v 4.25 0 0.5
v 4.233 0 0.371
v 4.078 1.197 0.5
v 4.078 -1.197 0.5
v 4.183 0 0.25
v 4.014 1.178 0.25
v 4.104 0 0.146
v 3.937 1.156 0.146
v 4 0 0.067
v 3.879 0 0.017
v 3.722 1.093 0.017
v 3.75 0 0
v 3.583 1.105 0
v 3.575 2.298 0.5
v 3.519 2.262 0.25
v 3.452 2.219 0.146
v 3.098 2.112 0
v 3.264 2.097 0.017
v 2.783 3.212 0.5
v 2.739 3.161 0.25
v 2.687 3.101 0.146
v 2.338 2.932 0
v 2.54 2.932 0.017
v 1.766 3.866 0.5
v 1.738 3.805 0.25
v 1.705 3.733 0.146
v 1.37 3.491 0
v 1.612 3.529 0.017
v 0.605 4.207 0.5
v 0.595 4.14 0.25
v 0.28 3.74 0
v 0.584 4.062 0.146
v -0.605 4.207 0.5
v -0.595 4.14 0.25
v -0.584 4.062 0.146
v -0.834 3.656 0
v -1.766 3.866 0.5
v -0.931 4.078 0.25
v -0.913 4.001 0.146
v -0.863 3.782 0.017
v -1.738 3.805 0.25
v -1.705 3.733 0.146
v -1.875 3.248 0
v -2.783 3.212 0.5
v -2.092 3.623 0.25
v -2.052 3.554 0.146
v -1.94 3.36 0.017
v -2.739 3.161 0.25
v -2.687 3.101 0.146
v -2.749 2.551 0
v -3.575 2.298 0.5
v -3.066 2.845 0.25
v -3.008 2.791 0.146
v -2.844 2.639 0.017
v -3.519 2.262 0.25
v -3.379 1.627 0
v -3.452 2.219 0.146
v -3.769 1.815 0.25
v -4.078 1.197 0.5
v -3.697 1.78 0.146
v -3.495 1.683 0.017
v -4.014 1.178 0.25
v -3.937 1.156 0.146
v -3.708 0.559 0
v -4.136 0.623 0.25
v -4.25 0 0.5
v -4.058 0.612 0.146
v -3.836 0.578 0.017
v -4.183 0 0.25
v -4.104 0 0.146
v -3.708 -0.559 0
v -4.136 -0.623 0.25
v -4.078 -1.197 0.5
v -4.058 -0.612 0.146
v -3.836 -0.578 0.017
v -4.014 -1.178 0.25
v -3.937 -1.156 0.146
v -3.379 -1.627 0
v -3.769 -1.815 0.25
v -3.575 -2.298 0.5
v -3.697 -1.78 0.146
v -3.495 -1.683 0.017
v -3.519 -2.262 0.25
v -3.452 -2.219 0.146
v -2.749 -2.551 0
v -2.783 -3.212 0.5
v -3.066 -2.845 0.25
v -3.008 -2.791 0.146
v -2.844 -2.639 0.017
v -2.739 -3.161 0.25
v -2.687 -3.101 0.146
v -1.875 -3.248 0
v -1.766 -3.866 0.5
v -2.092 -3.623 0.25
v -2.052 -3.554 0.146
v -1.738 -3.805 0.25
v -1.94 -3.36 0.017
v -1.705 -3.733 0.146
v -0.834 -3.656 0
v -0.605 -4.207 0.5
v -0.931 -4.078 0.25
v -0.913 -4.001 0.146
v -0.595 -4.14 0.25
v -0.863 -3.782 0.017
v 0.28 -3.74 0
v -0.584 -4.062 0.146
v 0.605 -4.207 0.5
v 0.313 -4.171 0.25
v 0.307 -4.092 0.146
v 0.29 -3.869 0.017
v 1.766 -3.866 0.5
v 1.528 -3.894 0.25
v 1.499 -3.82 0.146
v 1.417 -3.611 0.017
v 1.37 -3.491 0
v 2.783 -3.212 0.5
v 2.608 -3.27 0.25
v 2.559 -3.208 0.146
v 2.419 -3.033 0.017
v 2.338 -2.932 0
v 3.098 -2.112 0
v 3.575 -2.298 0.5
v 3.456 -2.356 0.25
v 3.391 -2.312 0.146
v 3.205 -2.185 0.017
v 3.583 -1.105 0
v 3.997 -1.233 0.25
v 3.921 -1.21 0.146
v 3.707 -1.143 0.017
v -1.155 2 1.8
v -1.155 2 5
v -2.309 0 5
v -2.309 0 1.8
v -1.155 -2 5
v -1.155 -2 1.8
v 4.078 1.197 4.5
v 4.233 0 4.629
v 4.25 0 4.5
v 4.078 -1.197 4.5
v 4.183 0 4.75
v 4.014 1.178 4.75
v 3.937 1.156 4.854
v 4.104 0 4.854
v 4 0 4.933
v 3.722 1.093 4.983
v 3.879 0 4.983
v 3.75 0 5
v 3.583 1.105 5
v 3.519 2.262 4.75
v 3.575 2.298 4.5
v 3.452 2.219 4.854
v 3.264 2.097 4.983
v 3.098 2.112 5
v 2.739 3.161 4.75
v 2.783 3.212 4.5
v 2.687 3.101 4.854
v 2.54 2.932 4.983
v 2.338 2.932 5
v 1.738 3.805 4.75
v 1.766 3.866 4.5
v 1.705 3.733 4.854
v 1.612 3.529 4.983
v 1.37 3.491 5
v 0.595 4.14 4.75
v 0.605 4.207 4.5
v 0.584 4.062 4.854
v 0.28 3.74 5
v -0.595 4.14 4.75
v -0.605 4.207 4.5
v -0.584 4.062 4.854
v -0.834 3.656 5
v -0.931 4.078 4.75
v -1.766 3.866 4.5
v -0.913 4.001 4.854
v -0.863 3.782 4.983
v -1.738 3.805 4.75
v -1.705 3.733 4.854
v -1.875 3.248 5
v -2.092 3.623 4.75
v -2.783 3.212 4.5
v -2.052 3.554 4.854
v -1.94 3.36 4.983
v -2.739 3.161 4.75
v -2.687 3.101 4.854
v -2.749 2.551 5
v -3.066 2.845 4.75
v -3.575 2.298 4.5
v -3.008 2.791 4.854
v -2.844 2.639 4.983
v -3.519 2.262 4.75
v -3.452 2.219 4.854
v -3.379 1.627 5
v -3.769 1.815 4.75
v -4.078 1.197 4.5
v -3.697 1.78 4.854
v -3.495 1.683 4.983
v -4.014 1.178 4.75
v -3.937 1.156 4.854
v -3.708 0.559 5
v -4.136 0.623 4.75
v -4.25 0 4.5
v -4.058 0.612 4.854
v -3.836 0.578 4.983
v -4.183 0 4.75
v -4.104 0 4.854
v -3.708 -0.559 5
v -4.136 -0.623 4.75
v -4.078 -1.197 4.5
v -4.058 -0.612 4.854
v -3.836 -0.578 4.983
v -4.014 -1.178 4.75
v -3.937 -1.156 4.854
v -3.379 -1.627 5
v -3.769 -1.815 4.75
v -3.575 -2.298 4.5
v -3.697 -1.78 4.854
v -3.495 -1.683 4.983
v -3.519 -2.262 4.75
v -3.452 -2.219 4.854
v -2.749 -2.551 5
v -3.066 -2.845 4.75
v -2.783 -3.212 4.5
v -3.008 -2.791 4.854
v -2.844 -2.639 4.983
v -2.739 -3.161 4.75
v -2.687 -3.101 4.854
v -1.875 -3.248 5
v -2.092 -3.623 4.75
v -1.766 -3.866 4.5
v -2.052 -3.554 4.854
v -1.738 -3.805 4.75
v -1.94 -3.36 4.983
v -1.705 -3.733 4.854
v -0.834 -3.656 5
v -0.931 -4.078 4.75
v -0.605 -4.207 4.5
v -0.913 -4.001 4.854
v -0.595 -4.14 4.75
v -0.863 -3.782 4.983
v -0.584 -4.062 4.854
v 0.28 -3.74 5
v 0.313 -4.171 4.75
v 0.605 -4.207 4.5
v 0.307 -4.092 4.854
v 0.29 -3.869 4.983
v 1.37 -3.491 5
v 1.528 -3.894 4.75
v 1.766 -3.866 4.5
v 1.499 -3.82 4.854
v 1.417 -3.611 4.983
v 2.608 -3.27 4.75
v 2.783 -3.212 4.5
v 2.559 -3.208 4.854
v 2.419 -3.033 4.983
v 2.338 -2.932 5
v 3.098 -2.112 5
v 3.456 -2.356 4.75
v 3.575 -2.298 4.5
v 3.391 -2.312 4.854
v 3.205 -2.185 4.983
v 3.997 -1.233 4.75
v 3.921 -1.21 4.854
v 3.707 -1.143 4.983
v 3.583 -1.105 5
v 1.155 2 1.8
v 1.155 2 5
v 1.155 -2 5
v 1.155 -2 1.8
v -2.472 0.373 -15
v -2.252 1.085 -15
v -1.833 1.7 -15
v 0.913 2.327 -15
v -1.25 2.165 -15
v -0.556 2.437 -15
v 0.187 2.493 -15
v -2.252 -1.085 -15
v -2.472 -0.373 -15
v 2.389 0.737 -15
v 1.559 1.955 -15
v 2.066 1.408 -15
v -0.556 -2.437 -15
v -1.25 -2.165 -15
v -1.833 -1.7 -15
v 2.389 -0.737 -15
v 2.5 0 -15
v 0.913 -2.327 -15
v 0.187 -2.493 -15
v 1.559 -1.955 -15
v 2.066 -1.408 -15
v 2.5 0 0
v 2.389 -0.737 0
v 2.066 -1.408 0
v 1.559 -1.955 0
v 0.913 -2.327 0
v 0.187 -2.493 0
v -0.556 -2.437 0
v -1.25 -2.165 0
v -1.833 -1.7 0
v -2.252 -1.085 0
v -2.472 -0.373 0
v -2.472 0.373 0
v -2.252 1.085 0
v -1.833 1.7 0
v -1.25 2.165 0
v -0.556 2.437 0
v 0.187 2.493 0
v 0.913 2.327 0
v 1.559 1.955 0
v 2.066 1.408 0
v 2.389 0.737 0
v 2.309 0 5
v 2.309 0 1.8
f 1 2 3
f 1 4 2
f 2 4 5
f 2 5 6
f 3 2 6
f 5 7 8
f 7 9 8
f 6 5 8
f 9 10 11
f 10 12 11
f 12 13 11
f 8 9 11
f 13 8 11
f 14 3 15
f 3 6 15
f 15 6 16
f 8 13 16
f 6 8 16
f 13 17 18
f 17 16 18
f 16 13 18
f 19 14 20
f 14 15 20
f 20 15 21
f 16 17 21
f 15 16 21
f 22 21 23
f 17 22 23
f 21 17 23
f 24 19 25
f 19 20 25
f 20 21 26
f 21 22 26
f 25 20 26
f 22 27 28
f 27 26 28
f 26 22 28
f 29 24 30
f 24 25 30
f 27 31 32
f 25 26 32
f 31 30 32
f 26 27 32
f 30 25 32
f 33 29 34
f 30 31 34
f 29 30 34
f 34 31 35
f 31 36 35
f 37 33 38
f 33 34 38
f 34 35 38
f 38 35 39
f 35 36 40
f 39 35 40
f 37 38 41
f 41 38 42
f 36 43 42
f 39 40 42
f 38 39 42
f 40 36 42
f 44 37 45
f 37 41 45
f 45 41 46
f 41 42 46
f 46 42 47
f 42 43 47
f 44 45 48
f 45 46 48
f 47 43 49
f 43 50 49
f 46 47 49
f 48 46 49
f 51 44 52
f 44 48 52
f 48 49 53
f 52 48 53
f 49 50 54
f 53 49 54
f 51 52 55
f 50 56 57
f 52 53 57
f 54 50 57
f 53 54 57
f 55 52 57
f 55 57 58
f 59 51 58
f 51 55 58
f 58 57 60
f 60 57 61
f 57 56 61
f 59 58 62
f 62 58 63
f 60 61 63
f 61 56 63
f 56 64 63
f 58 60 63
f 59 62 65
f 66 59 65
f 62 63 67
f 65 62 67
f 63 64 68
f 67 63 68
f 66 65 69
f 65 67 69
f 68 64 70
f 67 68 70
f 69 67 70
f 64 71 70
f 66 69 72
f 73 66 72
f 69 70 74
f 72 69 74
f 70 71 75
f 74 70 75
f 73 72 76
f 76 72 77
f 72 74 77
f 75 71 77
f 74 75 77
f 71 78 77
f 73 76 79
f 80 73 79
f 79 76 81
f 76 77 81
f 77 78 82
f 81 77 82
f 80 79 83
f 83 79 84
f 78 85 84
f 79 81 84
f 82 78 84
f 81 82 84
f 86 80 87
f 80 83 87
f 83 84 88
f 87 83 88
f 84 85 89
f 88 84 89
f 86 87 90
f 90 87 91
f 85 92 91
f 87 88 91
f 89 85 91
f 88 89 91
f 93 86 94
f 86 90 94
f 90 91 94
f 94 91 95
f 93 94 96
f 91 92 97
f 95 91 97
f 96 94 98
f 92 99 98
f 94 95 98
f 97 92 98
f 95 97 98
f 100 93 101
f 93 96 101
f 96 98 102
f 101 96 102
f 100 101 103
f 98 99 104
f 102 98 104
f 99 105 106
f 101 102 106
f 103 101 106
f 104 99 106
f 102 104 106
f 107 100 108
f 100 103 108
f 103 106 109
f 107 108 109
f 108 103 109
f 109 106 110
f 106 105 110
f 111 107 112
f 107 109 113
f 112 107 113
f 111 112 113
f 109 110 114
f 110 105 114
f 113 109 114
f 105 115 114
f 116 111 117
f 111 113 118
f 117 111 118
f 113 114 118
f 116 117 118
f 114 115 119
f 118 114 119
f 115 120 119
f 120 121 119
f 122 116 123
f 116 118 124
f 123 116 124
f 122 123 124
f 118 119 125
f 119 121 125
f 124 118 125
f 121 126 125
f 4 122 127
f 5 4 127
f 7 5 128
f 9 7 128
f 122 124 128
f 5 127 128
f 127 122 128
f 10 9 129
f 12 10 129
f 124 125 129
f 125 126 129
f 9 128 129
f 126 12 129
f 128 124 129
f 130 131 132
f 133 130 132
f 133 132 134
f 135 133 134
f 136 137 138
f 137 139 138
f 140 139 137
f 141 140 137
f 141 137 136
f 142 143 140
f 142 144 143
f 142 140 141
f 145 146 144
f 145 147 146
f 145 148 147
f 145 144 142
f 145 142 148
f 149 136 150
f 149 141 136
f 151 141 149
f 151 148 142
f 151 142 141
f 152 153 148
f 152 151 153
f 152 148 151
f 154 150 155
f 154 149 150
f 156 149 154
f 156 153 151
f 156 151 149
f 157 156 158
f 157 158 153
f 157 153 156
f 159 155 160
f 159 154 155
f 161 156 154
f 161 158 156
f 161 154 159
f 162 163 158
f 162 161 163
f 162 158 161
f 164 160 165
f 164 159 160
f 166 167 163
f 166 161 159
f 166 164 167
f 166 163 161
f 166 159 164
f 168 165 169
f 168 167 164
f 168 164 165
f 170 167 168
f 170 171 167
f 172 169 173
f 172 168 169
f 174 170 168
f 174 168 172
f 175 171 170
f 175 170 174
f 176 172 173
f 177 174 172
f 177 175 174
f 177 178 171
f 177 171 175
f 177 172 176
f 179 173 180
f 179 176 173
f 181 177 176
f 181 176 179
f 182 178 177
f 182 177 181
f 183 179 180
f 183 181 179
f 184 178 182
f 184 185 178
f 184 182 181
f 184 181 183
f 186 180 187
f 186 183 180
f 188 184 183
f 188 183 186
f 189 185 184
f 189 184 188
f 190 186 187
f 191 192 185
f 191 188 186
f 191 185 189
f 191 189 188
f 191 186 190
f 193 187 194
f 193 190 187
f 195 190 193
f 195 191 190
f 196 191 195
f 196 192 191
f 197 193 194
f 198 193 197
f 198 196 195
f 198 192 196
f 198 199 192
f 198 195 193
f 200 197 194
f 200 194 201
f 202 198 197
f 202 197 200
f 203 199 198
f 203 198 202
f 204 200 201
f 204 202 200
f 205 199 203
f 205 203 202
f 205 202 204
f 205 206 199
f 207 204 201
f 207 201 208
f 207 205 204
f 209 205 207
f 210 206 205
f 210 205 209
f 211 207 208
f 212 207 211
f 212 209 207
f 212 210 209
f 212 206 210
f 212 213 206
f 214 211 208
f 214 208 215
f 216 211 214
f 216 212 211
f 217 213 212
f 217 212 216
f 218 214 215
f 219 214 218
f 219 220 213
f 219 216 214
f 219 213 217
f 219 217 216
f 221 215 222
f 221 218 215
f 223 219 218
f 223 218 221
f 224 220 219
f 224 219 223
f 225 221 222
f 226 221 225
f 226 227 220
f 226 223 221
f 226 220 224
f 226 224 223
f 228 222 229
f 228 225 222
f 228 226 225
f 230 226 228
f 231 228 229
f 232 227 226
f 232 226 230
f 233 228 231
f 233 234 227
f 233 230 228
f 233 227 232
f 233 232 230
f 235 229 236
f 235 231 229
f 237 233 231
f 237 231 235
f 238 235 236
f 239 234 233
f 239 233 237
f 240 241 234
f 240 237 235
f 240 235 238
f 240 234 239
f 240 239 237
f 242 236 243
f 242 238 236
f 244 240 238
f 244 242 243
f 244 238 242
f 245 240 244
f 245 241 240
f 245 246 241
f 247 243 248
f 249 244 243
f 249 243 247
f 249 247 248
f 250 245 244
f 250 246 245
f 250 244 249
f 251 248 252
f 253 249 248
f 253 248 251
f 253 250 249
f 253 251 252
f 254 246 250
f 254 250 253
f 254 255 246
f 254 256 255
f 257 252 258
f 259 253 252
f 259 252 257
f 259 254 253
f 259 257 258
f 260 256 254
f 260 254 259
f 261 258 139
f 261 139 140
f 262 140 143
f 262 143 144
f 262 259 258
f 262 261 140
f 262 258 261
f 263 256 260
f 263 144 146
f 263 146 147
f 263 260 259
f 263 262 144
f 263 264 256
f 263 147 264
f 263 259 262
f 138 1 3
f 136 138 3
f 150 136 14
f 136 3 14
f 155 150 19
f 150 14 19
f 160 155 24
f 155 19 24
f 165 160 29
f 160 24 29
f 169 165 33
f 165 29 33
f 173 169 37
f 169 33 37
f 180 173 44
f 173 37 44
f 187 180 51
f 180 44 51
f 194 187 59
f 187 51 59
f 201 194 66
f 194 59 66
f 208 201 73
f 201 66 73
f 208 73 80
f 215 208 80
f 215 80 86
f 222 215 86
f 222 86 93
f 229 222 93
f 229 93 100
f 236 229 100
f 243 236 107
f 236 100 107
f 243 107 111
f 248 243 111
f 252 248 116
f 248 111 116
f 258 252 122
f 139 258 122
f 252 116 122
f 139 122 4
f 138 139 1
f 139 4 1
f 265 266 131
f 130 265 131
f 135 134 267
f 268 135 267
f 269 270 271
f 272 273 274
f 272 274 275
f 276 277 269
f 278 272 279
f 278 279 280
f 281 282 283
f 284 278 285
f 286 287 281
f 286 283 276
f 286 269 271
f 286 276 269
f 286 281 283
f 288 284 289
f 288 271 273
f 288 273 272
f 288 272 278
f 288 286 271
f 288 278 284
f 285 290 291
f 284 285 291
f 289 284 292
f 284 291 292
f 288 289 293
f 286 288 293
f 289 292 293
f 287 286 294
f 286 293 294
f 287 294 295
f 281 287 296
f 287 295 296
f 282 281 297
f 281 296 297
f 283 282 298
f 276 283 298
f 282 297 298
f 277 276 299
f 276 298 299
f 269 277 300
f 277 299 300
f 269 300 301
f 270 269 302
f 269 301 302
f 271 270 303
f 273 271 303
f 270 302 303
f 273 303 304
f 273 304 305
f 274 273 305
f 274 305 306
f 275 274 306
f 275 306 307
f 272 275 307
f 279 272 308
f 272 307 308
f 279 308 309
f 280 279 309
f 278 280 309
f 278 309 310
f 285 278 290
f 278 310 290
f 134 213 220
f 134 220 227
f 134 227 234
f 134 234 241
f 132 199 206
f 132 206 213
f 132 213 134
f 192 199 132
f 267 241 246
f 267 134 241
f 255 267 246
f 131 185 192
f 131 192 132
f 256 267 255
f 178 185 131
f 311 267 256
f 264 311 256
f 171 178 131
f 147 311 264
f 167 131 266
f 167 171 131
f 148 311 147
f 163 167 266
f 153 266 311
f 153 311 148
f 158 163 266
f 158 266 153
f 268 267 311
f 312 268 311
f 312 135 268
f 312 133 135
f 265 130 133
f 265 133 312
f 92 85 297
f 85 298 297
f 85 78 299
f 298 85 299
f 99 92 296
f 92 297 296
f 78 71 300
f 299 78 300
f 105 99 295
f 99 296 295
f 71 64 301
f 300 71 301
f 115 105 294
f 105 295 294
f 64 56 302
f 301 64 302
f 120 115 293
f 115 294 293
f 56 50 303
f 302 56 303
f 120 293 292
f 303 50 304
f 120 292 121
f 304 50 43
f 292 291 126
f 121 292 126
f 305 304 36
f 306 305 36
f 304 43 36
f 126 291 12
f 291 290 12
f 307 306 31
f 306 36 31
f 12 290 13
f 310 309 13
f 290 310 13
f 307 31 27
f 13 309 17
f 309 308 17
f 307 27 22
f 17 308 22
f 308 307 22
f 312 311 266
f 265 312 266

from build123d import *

# Parameters (mm, degrees)
F0_R     = 4.25
F1_DEPTH = 5
F2_R     = 2.5
F3_DEPTH = 15
F5_DEPTH = 3.2
F6_R     = 0.5


with BuildPart() as f1:
    # F0 (on Top) → F1 (new body)
    with BuildSketch(Plane.XY):
        Circle(F0_R)
    extrude(amount=F1_DEPTH)

    # F2 (on face) → F3 (join)
    with BuildSketch(Plane(origin=(0, 0, 0), x_dir=(1, 0, 0), z_dir=(0, 0, -1))):
        Circle(F2_R)
    extrude(amount=F3_DEPTH)

    # F4 (on face) → F5 (cut)
    with BuildSketch(Plane.XY.offset(5)):
        Polygon((-1.154701, -2), (1.154701, -2), (2.309401, 0), (1.154701, 2), (-1.154701, 2), (-2.309401, 0), align=None)
    extrude(amount=-F5_DEPTH, mode=Mode.SUBTRACT)

    # F6
    f6_edges = [f1.edges().sort_by_distance(p)[0] for p in [
        (-4.25, 0, 5),
        (-4.25, 0, 0),
    ]]
    fillet(f6_edges, radius=F6_R)


solid = f1.part
